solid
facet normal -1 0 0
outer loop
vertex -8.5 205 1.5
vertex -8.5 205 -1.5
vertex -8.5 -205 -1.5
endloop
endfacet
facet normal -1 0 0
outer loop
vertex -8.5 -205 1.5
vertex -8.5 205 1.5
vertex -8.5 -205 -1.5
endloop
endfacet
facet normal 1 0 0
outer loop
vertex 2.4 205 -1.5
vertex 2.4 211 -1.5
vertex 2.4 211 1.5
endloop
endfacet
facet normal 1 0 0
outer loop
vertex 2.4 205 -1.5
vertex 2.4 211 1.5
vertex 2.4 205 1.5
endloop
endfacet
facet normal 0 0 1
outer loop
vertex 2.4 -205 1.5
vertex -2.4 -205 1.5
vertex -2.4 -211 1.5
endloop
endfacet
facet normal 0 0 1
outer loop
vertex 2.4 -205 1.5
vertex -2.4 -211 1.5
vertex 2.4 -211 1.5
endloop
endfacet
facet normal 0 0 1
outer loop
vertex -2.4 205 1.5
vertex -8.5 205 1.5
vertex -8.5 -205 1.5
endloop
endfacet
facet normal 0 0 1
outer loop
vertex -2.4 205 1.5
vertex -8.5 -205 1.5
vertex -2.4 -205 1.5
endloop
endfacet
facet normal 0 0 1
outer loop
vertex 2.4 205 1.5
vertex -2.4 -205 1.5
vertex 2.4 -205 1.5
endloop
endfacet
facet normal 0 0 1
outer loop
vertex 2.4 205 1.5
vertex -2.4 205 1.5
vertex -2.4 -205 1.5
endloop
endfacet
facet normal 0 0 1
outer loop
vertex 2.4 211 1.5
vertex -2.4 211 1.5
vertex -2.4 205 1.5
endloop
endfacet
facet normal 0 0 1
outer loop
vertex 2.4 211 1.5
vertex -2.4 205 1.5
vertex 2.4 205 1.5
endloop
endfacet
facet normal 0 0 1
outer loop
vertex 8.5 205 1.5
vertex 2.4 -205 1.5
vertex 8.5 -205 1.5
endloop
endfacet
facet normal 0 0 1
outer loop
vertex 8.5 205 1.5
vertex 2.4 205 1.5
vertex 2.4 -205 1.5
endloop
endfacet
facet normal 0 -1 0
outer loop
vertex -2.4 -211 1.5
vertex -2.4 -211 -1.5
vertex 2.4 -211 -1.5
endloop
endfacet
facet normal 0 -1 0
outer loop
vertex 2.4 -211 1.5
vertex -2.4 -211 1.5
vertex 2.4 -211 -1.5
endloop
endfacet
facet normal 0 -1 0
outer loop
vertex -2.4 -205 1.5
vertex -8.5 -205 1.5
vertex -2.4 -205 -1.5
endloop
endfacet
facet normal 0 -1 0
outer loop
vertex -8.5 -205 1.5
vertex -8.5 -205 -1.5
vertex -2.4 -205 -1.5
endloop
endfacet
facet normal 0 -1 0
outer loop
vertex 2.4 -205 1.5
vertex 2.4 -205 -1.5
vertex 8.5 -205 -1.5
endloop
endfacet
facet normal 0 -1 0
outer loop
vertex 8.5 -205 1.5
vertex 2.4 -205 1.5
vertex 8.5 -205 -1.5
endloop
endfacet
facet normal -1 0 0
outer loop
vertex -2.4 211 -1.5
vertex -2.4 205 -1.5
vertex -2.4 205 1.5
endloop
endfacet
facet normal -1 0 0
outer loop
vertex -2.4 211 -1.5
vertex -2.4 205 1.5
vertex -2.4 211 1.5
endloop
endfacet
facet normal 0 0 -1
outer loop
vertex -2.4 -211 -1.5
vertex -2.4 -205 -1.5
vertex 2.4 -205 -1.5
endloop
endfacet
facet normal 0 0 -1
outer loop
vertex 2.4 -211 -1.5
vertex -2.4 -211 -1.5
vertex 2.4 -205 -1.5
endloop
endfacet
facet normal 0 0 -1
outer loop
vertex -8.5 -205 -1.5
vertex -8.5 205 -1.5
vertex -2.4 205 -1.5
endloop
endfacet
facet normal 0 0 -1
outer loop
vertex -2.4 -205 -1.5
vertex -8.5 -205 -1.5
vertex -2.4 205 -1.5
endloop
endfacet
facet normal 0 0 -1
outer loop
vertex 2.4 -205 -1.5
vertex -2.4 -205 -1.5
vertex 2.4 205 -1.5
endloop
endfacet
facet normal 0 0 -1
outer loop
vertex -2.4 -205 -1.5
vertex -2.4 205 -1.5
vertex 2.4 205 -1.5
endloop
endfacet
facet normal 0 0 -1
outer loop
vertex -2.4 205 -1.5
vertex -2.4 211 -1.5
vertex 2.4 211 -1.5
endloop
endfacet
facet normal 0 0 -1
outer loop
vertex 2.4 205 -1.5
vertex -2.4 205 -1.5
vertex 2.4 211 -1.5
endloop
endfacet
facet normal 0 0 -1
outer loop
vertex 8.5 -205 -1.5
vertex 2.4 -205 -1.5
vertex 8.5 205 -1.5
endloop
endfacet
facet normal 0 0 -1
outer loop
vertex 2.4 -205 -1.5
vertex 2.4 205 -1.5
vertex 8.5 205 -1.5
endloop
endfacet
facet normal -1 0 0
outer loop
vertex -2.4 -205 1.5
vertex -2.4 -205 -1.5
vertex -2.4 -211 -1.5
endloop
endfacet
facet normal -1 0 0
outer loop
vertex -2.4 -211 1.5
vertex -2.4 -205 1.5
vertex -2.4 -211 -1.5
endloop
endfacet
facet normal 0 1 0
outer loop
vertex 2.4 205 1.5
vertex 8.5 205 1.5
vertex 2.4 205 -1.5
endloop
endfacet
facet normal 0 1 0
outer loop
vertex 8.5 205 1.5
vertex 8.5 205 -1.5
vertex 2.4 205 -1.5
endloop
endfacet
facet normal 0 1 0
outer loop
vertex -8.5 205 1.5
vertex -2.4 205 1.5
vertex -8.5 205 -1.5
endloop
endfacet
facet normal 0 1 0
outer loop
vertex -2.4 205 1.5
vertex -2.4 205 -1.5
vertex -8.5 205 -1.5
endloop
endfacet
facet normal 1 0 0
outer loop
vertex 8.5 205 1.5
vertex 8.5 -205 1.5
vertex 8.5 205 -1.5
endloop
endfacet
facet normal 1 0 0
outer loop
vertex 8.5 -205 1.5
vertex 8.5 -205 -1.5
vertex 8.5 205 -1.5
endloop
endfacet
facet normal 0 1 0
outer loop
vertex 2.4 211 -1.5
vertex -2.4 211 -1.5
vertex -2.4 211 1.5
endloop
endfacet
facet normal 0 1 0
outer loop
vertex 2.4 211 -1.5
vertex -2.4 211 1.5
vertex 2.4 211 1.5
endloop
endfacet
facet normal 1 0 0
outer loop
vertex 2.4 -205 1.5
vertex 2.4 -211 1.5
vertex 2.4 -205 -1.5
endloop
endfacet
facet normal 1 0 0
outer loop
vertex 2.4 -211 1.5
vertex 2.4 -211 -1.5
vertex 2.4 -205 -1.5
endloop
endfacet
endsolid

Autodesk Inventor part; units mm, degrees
ref_plane "YZ Plane" through (0, 0, 0) normal (1, 0, 0) x (0, 1, 0)
ref_plane "XZ Plane" through (0, 0, 0) normal (0, 1, 0) x (-1, 0, 0)
ref_plane "XY Plane" through (0, 0, 0) normal (0, 0, 1) x (1, 0, 0)
sketch "Sketch1" plane through (0, 0, 0) normal (0, 0, 1) x (1, 0, 0)
  line L0 (-8.5, -205) -> (8.5, -205)
  line L1 (8.5, -205) -> (8.5, 205)
  line L2 (8.5, 205) -> (-8.5, 205)
  line L3 (-8.5, 205) -> (-8.5, -205)
  line L4 (-8.5, -205) -> (8.5, 205) construction
  line L5 (8.5, -205) -> (-8.5, 205) construction
  line L6 (-2.4, 211) -> (2.4, 211)
  line L7 (2.4, 211) -> (2.4, 205)
  line L8 (2.4, 205) -> (-2.4, 205)
  line L9 (-2.4, 205) -> (-2.4, 211)
  line L10 (-2.4, 211) -> (2.4, 205) construction
  line L11 (2.4, 211) -> (-2.4, 205) construction
  line L12 (-8.5, 0) -> (8.5, 0)
  line L13 (-2.4, -211) -> (2.4, -211)
  line L14 (2.4, -211) -> (2.4, -205)
  line L15 (2.4, -205) -> (-2.4, -205)
  line L16 (-2.4, -205) -> (-2.4, -211)
  line L17 (-2.4, -211) -> (2.4, -205) construction
  line L18 (2.4, -211) -> (-2.4, -205) construction
  point P0 (0, 0)
  point P1 (0, 208)
  point P2 (0, 205)
  point P3 (0, 205)
  point P4 (0, -208)
  point P5 (0, -205)
  point P6 (0, -205)
  dimension "d0" = 17
  dimension "d1" = 410
  dimension "d2" = 4.8
  dimension "d3" = 6
extrude "Plate1" add sketch "Sketch1" along normal mid plane 3
equation "\"d4\" = Thickness"
equation "\"BendRadius\" = Thickness"
equation "\"BendReliefWidth\" = Thickness"
equation "\"BendReliefDepth\" = 0.5 * Thickness"
equation "\"CornerReliefSize\" = 4 * Thickness"
equation "\"MinimumRemnant\" = 2 * Thickness"
equation "\"TransitionRadius\" = BendRadius"
equation "\"JacobiRadiusSize\" = BendRadius"
equation "\"GapSize\" = Thickness"
equation "\"Thickness\" = 3"
properties part number "Path Holder"
